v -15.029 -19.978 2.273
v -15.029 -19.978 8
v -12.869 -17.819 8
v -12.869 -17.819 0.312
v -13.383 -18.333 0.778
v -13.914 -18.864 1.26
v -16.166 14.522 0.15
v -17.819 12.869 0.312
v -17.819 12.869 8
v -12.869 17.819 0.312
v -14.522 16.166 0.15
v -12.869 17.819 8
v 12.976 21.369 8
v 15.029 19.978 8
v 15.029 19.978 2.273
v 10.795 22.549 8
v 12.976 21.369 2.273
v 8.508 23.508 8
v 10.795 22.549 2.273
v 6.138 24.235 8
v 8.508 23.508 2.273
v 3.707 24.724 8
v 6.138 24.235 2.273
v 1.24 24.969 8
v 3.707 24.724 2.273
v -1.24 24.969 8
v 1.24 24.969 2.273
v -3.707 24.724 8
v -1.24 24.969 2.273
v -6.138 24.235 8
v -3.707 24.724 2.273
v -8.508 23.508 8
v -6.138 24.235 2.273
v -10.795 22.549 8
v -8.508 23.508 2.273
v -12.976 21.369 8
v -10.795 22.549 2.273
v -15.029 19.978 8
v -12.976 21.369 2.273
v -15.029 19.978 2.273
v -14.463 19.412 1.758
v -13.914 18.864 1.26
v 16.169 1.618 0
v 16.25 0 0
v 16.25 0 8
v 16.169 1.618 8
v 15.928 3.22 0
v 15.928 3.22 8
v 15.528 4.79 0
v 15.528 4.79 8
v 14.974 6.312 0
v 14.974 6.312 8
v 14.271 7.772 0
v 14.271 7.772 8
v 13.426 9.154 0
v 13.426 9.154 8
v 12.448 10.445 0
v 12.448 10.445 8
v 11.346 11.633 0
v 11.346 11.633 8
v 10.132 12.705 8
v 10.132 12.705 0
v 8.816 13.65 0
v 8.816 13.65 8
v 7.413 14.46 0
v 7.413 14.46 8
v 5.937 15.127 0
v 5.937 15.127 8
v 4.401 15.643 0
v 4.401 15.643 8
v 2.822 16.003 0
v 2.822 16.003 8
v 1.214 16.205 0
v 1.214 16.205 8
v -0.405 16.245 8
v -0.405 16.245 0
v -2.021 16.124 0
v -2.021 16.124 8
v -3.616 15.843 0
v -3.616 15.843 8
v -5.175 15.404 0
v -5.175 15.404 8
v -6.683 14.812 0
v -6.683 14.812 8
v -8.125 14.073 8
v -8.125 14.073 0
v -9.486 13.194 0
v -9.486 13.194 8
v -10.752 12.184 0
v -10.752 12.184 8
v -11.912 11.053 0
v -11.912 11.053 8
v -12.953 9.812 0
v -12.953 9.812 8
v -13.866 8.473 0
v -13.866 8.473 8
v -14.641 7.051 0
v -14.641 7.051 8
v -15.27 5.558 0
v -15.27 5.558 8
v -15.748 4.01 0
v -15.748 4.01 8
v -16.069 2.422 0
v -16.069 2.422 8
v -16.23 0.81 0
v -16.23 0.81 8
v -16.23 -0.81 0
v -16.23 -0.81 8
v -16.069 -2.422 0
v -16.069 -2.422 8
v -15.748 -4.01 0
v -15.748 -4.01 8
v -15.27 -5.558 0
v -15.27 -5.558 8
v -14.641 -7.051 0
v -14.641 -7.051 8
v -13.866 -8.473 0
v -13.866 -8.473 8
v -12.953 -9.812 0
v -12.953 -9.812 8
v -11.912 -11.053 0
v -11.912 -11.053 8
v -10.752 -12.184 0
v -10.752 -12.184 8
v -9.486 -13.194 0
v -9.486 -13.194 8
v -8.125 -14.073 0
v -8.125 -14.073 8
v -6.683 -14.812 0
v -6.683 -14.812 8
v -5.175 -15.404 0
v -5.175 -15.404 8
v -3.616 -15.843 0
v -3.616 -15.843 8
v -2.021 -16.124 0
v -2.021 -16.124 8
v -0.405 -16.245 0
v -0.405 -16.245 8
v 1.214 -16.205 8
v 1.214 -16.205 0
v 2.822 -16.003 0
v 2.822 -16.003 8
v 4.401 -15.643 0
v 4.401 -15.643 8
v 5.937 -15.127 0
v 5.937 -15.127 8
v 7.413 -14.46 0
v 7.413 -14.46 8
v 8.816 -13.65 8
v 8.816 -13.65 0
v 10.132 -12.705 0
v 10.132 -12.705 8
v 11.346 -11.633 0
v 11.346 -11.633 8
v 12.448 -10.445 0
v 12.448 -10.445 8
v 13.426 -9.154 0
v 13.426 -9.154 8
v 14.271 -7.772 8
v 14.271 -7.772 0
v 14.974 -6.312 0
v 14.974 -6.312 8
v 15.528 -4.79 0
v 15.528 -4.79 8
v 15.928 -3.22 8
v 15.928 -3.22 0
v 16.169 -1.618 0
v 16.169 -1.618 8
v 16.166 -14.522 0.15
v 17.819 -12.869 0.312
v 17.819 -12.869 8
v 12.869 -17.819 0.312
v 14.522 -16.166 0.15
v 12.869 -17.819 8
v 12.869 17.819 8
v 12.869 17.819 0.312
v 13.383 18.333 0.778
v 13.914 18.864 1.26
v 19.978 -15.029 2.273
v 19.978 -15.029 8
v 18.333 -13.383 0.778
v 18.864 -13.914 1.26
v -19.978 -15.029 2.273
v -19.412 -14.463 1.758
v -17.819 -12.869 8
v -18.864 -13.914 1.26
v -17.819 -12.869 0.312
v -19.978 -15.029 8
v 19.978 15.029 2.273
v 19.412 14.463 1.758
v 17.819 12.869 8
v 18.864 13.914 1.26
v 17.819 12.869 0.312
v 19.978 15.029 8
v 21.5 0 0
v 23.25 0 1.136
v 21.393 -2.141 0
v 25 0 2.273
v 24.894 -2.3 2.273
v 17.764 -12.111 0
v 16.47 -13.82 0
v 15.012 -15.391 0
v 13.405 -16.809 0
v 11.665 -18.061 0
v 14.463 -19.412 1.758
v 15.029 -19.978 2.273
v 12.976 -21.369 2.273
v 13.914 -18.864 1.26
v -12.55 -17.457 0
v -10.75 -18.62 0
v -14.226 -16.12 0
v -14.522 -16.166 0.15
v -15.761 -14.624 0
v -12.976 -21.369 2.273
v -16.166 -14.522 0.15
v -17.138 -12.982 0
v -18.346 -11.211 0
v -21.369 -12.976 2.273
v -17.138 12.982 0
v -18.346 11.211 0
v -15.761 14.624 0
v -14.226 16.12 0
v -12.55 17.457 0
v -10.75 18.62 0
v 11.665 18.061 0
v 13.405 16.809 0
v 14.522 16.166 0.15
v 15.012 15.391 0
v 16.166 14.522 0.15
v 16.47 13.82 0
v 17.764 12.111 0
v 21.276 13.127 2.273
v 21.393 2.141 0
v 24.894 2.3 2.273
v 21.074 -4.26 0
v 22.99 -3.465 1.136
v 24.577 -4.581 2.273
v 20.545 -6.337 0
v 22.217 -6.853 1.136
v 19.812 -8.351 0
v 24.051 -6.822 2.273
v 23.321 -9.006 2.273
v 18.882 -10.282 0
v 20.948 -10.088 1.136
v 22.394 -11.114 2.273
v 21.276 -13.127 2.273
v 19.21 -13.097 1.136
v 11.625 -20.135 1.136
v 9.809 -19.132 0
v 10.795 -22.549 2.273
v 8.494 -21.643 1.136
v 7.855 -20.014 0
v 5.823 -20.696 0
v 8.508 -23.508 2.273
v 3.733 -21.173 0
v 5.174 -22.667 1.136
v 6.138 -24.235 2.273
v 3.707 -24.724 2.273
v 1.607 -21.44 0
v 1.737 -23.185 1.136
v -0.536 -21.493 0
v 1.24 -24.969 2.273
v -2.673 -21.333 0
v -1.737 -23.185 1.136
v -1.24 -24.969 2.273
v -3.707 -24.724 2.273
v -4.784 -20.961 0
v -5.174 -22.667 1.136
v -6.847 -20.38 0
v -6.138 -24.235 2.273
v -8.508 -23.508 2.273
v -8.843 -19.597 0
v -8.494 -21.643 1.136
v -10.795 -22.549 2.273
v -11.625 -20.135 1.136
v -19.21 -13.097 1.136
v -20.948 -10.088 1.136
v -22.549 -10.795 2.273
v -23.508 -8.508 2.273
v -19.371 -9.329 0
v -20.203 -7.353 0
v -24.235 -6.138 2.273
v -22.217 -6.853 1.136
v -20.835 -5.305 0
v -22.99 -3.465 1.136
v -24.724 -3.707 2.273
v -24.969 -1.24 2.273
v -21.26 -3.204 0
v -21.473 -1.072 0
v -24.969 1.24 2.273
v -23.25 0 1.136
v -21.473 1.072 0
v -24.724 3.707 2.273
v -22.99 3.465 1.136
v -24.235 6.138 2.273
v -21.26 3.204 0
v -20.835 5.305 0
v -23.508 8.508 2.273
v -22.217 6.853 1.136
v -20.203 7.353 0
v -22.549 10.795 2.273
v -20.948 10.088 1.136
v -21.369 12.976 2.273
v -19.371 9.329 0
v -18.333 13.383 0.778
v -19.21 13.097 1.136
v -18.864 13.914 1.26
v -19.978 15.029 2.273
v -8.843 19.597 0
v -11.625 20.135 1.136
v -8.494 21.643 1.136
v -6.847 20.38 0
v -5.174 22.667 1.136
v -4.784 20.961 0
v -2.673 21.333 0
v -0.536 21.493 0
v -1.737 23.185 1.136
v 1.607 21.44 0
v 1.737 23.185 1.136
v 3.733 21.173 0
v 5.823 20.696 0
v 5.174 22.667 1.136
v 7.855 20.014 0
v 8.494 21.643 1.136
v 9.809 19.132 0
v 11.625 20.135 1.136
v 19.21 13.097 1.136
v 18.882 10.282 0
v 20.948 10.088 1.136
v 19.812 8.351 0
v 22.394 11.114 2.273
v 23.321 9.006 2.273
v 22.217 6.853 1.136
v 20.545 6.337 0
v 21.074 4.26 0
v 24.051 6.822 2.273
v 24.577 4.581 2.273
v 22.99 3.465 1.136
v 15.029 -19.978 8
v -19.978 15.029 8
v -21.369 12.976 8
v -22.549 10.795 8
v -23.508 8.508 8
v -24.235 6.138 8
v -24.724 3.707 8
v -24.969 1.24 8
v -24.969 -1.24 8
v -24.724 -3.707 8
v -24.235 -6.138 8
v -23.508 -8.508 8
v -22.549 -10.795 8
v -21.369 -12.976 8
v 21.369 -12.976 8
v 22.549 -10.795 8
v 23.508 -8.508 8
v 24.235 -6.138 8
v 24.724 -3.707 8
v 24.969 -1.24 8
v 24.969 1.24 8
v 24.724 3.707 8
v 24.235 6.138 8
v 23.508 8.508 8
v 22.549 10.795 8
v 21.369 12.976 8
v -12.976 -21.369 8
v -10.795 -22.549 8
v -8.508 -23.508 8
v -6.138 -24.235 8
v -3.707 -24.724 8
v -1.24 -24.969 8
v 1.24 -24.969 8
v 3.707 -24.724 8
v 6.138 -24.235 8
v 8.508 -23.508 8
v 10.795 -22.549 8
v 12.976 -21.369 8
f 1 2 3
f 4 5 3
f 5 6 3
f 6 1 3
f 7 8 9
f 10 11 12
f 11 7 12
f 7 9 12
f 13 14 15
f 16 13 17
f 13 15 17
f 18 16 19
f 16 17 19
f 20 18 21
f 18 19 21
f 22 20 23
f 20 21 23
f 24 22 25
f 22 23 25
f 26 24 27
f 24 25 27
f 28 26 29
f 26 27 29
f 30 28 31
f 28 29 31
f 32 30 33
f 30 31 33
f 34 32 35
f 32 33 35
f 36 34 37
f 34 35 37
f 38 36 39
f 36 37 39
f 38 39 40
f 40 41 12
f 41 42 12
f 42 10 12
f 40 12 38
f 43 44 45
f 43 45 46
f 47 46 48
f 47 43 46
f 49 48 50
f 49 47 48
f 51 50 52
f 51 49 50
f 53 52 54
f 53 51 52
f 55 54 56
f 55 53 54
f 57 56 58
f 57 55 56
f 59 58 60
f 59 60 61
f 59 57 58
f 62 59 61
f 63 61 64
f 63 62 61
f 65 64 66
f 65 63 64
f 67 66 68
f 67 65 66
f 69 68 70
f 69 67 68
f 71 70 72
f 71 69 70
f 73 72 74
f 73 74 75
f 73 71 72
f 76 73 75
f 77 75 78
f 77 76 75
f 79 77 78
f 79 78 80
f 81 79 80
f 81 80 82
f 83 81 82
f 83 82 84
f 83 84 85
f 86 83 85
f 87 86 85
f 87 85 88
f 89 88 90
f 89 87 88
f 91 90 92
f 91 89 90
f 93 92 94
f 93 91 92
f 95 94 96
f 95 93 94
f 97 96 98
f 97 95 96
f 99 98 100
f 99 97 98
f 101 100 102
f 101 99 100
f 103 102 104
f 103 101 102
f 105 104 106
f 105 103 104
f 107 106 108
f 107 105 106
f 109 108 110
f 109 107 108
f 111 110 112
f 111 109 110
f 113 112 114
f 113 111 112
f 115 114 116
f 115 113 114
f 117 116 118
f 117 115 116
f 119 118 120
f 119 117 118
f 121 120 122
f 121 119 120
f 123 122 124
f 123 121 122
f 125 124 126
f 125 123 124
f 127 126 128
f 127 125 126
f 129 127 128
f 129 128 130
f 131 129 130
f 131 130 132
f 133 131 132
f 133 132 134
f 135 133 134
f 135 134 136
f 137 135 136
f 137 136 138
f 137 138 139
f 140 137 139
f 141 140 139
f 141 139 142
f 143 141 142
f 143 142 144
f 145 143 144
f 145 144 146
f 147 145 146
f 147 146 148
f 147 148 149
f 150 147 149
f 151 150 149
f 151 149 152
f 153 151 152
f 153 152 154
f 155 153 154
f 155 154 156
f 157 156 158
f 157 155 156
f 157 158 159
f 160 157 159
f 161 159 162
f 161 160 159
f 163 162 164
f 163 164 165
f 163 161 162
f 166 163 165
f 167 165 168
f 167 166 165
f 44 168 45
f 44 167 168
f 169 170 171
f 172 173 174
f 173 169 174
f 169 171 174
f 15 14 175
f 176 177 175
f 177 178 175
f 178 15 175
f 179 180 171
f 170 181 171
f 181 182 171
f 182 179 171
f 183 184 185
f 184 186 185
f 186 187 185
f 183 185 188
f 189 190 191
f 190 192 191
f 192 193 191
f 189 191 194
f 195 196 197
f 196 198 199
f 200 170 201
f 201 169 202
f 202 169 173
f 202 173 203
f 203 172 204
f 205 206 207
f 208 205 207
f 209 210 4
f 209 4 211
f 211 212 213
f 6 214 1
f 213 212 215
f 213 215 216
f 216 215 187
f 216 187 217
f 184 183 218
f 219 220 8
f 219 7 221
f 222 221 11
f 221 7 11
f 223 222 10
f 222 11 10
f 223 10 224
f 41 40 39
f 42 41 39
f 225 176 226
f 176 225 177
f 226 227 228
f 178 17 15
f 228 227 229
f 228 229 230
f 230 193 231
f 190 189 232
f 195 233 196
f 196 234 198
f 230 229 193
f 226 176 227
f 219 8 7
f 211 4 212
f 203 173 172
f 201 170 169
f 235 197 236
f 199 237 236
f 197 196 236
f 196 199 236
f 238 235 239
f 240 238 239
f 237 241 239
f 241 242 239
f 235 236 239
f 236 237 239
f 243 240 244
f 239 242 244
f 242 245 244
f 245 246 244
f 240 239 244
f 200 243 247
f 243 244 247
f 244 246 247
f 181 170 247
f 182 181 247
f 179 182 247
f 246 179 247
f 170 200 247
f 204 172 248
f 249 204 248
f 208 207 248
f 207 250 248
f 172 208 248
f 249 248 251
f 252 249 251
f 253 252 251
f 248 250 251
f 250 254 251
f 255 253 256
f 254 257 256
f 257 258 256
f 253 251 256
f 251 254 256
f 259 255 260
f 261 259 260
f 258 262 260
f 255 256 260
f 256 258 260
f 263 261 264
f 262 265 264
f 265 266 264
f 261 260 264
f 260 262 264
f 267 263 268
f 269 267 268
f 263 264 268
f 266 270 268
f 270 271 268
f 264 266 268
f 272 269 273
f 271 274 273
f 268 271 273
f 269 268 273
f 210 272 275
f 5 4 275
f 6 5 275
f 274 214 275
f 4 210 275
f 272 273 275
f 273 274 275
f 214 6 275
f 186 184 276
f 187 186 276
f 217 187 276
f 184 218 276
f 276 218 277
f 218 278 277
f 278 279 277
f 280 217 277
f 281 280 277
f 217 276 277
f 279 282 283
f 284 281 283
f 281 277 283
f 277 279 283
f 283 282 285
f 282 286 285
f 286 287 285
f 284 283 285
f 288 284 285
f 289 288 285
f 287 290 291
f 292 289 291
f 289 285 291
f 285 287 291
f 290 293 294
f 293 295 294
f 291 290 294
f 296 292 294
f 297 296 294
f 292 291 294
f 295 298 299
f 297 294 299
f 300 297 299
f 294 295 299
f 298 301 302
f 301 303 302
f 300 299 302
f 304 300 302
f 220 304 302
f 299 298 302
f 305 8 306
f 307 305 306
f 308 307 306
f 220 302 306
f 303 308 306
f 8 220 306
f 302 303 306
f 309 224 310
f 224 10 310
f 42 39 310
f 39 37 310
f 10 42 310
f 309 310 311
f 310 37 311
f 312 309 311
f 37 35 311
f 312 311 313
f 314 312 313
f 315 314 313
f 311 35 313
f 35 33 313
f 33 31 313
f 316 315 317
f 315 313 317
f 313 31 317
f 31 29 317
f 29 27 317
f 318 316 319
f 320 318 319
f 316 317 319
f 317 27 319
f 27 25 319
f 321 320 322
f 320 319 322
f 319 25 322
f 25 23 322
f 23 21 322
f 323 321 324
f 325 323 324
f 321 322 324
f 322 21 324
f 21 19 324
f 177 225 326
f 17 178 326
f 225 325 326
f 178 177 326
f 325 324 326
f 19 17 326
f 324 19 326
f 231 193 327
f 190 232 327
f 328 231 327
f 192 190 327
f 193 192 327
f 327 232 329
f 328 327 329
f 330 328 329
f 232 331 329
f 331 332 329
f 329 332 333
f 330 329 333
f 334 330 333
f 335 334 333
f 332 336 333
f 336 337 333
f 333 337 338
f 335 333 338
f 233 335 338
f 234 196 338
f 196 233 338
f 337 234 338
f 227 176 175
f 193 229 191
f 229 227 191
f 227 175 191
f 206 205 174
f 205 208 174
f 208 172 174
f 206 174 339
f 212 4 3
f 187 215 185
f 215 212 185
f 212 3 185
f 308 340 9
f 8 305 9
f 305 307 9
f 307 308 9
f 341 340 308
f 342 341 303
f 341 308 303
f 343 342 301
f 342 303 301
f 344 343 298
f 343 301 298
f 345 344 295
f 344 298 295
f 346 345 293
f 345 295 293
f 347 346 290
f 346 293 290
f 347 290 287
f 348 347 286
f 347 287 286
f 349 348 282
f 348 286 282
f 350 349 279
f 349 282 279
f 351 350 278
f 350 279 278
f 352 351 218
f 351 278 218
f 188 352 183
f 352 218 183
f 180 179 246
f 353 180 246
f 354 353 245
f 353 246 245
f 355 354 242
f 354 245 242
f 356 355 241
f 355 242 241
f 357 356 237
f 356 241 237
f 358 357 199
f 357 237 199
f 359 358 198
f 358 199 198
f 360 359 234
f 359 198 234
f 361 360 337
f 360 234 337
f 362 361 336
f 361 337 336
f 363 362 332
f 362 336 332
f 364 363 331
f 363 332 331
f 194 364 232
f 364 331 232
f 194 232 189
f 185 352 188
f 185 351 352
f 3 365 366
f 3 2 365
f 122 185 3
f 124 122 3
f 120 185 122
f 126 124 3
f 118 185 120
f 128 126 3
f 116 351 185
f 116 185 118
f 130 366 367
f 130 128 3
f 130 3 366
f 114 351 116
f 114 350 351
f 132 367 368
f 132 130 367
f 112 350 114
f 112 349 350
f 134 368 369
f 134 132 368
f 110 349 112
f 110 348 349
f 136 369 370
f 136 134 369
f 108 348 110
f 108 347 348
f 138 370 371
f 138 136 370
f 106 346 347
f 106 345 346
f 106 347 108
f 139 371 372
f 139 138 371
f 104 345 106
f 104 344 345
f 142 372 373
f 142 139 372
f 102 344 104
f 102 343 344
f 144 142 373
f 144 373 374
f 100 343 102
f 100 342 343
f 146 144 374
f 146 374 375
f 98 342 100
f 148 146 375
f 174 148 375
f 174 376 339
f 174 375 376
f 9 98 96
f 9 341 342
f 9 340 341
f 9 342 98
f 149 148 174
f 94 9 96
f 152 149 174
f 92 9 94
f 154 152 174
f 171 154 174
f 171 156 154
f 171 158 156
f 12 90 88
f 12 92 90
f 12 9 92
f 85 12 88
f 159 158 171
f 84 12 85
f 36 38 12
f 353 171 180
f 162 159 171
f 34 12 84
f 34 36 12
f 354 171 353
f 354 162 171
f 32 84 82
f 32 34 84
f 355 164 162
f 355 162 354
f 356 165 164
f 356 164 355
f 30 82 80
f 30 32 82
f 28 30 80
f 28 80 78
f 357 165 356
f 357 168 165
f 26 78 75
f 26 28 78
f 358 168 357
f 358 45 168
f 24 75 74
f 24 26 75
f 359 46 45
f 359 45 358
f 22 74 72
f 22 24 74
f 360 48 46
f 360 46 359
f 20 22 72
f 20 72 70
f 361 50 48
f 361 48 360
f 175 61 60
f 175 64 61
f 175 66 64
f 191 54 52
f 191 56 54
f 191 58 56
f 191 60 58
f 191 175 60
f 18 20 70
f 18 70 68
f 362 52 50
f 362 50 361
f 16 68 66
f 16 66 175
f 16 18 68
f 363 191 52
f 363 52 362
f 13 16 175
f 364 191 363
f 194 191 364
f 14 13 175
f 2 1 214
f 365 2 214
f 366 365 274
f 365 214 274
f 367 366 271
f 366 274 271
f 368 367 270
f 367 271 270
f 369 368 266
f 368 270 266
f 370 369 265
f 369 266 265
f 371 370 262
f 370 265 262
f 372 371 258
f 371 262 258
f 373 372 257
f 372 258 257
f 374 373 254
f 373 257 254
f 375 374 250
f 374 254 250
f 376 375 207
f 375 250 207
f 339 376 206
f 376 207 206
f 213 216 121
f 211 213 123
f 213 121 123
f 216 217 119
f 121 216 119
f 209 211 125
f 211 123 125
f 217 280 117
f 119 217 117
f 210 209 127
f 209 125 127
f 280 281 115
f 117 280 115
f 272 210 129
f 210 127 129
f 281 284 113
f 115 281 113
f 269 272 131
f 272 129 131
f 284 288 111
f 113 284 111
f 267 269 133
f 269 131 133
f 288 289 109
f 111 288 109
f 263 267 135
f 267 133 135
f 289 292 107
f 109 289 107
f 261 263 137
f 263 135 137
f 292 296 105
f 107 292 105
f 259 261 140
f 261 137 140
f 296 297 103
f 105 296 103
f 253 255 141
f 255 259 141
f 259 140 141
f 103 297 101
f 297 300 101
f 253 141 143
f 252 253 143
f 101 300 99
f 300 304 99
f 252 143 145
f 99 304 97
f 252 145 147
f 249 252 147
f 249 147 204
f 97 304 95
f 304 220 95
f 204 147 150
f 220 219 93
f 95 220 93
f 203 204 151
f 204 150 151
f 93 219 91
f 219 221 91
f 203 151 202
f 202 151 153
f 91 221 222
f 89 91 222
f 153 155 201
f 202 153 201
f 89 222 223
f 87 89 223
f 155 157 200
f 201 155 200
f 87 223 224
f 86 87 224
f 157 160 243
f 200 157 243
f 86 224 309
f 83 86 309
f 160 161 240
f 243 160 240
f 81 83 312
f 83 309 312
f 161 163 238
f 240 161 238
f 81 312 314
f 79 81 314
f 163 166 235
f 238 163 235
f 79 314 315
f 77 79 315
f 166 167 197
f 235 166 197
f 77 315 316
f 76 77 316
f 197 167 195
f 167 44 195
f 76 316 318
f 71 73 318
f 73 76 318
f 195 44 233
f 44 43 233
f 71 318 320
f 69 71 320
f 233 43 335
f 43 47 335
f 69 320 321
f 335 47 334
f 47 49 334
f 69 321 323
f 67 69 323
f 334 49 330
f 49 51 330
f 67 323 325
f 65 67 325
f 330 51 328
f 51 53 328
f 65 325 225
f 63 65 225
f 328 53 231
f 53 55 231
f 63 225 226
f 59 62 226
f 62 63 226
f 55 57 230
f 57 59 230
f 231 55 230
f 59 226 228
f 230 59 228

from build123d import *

# Parameters (mm, degrees)
SKETCH1_R          = 25
SKETCH1_R_2        = 16.25
EXTRUDE1_DEPTH     = 8
CUT_EXTRUDE1_DEPTH = 9
CIRPATTERN1_COUNT  = 4


with BuildPart() as part:
    # Sketch1 → Extrude1 (new body)
    with BuildSketch(Plane.XY):
        Circle(SKETCH1_R)
        Circle(SKETCH1_R_2, mode=Mode.SUBTRACT)
    extrude(amount=EXTRUDE1_DEPTH)

    # Sketch2 → Cut-Extrude1 (cut, through all)
    with BuildSketch(Plane.XY.offset(8)):
        with BuildLine():
            Line((15.02869733, 19.978444798), (12.869343418, 17.819090886))
            Line((12.869343418, 17.819090886), (17.819090886, 12.869343418))
            Line((17.819090886, 12.869343418), (19.978444798, 15.02869733))
            ThreePointArc((19.978444798, 15.02869733), (17.67766953, 17.67766953), (15.02869733, 19.978444798))
        make_face()
    cut_extrude1 = extrude(amount=-CUT_EXTRUDE1_DEPTH, mode=Mode.SUBTRACT)

    # CirPattern1: Cut-Extrude1 ×4 about axis
    cirpattern1_axis = Axis((0, 0, 0), (0, 0, 1))
    for i in range(1, CIRPATTERN1_COUNT):
        add(cut_extrude1.rotate(cirpattern1_axis, i * 360 / CIRPATTERN1_COUNT), mode=Mode.SUBTRACT)

    # Sketch3 → Cut-Revolve1 (revolve, cut)
    with BuildSketch(Plane(origin=(0, 0, 0), x_dir=(1, 0, 0), z_dir=(0, 1, 0))):
        Polygon((25, 0), (21.5, 0), (25, -2.272926576), align=None)
    revolve(axis=Axis((0, 0, 0), (0, 0, -1)), mode=Mode.SUBTRACT)


solid = part.part
